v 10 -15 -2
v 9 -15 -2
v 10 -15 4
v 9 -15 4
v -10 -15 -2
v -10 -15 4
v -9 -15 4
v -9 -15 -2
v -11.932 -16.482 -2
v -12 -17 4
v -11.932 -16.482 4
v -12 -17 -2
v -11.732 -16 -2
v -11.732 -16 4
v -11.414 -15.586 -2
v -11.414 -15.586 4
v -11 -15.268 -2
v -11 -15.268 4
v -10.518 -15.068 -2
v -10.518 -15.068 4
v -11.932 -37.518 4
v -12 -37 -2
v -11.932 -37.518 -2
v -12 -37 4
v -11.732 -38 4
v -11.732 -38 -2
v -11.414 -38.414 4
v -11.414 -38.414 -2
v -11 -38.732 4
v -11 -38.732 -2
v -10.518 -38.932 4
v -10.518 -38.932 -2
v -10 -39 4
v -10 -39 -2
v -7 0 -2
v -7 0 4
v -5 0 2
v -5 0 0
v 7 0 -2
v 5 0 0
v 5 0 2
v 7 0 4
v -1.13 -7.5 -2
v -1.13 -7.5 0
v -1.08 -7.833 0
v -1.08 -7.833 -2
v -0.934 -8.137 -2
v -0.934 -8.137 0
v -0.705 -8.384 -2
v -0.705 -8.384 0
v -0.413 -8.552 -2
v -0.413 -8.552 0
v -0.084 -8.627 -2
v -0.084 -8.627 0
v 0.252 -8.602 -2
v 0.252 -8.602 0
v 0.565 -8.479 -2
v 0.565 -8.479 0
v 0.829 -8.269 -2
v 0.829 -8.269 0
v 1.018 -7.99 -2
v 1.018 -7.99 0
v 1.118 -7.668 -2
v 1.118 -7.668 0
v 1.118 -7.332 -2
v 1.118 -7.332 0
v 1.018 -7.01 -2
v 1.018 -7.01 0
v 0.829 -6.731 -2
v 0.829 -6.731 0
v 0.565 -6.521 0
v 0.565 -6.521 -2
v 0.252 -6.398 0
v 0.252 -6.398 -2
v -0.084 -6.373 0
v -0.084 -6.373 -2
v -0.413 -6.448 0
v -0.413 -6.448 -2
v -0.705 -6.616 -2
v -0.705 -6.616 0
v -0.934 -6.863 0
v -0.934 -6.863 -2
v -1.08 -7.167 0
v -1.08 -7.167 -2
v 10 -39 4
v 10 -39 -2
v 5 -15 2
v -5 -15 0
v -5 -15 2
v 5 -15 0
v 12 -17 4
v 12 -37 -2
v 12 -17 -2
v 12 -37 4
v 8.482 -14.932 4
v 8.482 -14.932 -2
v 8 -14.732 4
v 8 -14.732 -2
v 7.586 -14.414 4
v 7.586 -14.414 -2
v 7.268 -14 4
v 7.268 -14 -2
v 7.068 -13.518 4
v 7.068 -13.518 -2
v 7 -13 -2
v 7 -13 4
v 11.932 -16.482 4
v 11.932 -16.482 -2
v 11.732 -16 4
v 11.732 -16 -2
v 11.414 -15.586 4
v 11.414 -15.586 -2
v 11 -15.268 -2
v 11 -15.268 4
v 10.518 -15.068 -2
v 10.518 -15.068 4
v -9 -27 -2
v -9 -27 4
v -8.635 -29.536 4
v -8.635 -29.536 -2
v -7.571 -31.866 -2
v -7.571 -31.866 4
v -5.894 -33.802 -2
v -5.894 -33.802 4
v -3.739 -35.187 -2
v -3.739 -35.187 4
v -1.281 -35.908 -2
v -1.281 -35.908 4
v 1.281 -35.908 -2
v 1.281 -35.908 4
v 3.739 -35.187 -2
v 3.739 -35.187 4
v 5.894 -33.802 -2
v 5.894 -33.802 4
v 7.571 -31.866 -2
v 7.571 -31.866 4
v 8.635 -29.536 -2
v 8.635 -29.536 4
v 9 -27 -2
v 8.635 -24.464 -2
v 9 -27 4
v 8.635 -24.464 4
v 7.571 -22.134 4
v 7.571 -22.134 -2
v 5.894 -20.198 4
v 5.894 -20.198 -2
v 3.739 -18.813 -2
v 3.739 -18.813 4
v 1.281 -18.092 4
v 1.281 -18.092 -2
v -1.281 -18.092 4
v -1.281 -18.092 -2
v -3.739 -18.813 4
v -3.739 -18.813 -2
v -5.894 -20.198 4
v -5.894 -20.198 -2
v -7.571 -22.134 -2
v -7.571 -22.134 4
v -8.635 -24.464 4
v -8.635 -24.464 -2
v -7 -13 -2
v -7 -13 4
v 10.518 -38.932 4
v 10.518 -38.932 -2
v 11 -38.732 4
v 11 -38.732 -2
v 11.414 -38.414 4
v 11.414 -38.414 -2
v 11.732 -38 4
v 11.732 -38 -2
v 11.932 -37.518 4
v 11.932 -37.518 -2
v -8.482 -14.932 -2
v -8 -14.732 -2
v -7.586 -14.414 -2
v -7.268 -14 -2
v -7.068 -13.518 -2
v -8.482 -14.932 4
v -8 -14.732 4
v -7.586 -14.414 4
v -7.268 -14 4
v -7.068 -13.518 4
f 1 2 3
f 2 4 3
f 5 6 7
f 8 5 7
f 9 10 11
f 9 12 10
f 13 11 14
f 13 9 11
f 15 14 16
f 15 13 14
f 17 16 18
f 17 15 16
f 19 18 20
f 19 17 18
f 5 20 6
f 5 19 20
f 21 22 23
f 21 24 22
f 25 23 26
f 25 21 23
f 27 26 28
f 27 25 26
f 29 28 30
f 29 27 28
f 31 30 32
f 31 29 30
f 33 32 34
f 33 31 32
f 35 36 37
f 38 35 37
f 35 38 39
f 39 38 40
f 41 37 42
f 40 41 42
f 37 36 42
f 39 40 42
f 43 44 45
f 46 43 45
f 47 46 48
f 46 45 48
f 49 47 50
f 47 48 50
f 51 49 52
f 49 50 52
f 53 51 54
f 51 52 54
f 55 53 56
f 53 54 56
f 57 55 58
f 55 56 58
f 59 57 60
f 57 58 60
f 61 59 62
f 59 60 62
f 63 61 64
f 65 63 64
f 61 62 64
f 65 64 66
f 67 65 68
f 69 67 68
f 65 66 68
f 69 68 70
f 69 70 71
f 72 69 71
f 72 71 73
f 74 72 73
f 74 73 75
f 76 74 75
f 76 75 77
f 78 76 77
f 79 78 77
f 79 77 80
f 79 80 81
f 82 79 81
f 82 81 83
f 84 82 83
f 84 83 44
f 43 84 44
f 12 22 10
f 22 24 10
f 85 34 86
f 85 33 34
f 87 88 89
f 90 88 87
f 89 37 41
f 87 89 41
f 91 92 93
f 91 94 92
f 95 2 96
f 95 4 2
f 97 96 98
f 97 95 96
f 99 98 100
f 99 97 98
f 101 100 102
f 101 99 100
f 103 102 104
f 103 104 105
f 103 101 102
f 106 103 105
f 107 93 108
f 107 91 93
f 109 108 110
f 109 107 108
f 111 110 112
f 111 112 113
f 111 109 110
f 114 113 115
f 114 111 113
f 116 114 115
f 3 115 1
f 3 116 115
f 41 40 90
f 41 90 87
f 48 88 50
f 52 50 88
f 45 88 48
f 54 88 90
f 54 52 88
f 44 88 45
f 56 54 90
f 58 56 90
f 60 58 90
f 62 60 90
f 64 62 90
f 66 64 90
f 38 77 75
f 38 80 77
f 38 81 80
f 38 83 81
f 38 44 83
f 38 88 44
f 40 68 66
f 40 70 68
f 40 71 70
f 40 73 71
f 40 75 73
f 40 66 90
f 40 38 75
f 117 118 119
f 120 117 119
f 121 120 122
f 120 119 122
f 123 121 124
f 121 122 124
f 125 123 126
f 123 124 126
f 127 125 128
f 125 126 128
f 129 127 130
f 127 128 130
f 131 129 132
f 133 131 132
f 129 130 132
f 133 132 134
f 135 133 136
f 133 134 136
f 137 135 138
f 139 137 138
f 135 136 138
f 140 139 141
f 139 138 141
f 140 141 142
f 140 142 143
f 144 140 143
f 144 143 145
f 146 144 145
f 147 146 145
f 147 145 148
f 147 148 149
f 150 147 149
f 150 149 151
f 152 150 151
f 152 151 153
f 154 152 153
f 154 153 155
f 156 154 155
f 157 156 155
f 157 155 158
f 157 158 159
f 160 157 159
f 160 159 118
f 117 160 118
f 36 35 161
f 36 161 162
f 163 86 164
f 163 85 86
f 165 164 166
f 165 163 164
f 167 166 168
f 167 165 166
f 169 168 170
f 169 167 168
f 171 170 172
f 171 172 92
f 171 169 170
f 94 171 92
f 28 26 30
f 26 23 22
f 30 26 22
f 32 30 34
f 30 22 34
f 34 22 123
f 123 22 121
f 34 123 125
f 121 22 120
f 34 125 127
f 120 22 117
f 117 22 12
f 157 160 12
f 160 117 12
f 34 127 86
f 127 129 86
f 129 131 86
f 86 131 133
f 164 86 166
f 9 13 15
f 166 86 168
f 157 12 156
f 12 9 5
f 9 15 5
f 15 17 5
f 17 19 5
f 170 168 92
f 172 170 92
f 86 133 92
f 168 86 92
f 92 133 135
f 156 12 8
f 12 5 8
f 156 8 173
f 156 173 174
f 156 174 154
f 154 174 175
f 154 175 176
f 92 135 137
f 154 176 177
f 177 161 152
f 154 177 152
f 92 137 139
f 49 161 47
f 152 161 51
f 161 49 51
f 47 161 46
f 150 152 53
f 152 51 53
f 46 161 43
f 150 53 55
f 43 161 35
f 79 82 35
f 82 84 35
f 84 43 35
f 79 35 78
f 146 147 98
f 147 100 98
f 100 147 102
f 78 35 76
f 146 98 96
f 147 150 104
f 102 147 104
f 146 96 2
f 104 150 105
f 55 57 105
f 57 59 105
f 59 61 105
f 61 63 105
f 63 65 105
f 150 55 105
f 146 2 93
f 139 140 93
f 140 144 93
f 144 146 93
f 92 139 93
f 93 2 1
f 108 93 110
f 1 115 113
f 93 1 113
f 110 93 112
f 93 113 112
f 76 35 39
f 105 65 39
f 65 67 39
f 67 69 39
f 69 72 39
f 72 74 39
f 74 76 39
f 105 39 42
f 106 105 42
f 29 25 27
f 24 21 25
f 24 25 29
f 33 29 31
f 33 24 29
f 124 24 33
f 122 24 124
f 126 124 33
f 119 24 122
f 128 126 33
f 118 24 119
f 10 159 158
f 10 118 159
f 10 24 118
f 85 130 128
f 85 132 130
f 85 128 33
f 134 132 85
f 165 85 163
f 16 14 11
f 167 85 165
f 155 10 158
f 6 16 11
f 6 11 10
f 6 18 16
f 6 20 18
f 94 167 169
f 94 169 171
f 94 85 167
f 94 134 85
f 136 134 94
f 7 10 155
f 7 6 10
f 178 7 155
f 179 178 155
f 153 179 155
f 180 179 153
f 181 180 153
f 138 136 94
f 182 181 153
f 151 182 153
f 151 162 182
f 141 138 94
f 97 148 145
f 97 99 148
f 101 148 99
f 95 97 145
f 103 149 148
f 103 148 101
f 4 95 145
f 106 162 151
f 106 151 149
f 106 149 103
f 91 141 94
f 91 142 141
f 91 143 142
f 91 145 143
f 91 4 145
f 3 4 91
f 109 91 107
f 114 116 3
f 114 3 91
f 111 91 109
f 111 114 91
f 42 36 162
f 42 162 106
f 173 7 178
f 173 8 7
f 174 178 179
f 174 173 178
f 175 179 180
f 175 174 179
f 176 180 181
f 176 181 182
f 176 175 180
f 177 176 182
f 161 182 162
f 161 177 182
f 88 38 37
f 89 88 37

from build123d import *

# Parameters (mm, degrees)
F0_W          = 14
F0_H          = 6
F0_W_2        = 10
F0_H_2        = 2
F1_DEPTH      = 15
F2_W          = 24
F2_H          = 24
F3_DEPTH      = 4
F3_DEPTH_BACK = 2
F5_D          = 18
F6_R          = 2
F7_D          = 2.2606
F7_DEPTH      = 2.3
F7_TIP        = 0.6791527577


with BuildPart() as f1:
    # F0 (on Front) → F1 (new body)
    with BuildSketch(Plane.XZ):
        with Locations((0, 1)):
            Rectangle(F0_W, F0_H)
        with Locations((0, 1)):
            Rectangle(F0_W_2, F0_H_2, mode=Mode.SUBTRACT)
    extrude(amount=F1_DEPTH)

    # F2 (on Top) → F3 (join, two sides)
    with BuildSketch(Plane.XY) as f3_sk:
        with Locations((0, -27)):
            Rectangle(F2_W, F2_H)
    extrude(amount=F3_DEPTH)
    extrude(f3_sk.sketch, amount=-F3_DEPTH_BACK)

    # F5 (through all)
    with Locations(Plane(origin=(0, 0, -2), x_dir=(1, 0, 0), z_dir=(0, 0, -1))):
        with Locations((0, 27)):
            Hole(F5_D / 2)

    # F6
    f6_edges = [f1.edges().sort_by_distance(p)[0] for p in [
        (12, -39, 1),
        (12, -15, 1),
        (7, -15, 1),
        (-12, -39, 1),
        (-12, -15, 1),
        (-7, -15, 1),
    ]]
    fillet(f6_edges, radius=F6_R)

    # F7
    with Locations(Plane(origin=(0, 0, -2), x_dir=(1, 0, 0), z_dir=(0, 0, -1))):
        with Locations((0, 7.5)):
            Hole(F7_D / 2, depth=F7_DEPTH)
            with Locations((0, 0, -(F7_DEPTH + F7_TIP / 2))):  # 118° drill point
                Cone(0, F7_D / 2, F7_TIP, mode=Mode.SUBTRACT)


solid = f1.part
